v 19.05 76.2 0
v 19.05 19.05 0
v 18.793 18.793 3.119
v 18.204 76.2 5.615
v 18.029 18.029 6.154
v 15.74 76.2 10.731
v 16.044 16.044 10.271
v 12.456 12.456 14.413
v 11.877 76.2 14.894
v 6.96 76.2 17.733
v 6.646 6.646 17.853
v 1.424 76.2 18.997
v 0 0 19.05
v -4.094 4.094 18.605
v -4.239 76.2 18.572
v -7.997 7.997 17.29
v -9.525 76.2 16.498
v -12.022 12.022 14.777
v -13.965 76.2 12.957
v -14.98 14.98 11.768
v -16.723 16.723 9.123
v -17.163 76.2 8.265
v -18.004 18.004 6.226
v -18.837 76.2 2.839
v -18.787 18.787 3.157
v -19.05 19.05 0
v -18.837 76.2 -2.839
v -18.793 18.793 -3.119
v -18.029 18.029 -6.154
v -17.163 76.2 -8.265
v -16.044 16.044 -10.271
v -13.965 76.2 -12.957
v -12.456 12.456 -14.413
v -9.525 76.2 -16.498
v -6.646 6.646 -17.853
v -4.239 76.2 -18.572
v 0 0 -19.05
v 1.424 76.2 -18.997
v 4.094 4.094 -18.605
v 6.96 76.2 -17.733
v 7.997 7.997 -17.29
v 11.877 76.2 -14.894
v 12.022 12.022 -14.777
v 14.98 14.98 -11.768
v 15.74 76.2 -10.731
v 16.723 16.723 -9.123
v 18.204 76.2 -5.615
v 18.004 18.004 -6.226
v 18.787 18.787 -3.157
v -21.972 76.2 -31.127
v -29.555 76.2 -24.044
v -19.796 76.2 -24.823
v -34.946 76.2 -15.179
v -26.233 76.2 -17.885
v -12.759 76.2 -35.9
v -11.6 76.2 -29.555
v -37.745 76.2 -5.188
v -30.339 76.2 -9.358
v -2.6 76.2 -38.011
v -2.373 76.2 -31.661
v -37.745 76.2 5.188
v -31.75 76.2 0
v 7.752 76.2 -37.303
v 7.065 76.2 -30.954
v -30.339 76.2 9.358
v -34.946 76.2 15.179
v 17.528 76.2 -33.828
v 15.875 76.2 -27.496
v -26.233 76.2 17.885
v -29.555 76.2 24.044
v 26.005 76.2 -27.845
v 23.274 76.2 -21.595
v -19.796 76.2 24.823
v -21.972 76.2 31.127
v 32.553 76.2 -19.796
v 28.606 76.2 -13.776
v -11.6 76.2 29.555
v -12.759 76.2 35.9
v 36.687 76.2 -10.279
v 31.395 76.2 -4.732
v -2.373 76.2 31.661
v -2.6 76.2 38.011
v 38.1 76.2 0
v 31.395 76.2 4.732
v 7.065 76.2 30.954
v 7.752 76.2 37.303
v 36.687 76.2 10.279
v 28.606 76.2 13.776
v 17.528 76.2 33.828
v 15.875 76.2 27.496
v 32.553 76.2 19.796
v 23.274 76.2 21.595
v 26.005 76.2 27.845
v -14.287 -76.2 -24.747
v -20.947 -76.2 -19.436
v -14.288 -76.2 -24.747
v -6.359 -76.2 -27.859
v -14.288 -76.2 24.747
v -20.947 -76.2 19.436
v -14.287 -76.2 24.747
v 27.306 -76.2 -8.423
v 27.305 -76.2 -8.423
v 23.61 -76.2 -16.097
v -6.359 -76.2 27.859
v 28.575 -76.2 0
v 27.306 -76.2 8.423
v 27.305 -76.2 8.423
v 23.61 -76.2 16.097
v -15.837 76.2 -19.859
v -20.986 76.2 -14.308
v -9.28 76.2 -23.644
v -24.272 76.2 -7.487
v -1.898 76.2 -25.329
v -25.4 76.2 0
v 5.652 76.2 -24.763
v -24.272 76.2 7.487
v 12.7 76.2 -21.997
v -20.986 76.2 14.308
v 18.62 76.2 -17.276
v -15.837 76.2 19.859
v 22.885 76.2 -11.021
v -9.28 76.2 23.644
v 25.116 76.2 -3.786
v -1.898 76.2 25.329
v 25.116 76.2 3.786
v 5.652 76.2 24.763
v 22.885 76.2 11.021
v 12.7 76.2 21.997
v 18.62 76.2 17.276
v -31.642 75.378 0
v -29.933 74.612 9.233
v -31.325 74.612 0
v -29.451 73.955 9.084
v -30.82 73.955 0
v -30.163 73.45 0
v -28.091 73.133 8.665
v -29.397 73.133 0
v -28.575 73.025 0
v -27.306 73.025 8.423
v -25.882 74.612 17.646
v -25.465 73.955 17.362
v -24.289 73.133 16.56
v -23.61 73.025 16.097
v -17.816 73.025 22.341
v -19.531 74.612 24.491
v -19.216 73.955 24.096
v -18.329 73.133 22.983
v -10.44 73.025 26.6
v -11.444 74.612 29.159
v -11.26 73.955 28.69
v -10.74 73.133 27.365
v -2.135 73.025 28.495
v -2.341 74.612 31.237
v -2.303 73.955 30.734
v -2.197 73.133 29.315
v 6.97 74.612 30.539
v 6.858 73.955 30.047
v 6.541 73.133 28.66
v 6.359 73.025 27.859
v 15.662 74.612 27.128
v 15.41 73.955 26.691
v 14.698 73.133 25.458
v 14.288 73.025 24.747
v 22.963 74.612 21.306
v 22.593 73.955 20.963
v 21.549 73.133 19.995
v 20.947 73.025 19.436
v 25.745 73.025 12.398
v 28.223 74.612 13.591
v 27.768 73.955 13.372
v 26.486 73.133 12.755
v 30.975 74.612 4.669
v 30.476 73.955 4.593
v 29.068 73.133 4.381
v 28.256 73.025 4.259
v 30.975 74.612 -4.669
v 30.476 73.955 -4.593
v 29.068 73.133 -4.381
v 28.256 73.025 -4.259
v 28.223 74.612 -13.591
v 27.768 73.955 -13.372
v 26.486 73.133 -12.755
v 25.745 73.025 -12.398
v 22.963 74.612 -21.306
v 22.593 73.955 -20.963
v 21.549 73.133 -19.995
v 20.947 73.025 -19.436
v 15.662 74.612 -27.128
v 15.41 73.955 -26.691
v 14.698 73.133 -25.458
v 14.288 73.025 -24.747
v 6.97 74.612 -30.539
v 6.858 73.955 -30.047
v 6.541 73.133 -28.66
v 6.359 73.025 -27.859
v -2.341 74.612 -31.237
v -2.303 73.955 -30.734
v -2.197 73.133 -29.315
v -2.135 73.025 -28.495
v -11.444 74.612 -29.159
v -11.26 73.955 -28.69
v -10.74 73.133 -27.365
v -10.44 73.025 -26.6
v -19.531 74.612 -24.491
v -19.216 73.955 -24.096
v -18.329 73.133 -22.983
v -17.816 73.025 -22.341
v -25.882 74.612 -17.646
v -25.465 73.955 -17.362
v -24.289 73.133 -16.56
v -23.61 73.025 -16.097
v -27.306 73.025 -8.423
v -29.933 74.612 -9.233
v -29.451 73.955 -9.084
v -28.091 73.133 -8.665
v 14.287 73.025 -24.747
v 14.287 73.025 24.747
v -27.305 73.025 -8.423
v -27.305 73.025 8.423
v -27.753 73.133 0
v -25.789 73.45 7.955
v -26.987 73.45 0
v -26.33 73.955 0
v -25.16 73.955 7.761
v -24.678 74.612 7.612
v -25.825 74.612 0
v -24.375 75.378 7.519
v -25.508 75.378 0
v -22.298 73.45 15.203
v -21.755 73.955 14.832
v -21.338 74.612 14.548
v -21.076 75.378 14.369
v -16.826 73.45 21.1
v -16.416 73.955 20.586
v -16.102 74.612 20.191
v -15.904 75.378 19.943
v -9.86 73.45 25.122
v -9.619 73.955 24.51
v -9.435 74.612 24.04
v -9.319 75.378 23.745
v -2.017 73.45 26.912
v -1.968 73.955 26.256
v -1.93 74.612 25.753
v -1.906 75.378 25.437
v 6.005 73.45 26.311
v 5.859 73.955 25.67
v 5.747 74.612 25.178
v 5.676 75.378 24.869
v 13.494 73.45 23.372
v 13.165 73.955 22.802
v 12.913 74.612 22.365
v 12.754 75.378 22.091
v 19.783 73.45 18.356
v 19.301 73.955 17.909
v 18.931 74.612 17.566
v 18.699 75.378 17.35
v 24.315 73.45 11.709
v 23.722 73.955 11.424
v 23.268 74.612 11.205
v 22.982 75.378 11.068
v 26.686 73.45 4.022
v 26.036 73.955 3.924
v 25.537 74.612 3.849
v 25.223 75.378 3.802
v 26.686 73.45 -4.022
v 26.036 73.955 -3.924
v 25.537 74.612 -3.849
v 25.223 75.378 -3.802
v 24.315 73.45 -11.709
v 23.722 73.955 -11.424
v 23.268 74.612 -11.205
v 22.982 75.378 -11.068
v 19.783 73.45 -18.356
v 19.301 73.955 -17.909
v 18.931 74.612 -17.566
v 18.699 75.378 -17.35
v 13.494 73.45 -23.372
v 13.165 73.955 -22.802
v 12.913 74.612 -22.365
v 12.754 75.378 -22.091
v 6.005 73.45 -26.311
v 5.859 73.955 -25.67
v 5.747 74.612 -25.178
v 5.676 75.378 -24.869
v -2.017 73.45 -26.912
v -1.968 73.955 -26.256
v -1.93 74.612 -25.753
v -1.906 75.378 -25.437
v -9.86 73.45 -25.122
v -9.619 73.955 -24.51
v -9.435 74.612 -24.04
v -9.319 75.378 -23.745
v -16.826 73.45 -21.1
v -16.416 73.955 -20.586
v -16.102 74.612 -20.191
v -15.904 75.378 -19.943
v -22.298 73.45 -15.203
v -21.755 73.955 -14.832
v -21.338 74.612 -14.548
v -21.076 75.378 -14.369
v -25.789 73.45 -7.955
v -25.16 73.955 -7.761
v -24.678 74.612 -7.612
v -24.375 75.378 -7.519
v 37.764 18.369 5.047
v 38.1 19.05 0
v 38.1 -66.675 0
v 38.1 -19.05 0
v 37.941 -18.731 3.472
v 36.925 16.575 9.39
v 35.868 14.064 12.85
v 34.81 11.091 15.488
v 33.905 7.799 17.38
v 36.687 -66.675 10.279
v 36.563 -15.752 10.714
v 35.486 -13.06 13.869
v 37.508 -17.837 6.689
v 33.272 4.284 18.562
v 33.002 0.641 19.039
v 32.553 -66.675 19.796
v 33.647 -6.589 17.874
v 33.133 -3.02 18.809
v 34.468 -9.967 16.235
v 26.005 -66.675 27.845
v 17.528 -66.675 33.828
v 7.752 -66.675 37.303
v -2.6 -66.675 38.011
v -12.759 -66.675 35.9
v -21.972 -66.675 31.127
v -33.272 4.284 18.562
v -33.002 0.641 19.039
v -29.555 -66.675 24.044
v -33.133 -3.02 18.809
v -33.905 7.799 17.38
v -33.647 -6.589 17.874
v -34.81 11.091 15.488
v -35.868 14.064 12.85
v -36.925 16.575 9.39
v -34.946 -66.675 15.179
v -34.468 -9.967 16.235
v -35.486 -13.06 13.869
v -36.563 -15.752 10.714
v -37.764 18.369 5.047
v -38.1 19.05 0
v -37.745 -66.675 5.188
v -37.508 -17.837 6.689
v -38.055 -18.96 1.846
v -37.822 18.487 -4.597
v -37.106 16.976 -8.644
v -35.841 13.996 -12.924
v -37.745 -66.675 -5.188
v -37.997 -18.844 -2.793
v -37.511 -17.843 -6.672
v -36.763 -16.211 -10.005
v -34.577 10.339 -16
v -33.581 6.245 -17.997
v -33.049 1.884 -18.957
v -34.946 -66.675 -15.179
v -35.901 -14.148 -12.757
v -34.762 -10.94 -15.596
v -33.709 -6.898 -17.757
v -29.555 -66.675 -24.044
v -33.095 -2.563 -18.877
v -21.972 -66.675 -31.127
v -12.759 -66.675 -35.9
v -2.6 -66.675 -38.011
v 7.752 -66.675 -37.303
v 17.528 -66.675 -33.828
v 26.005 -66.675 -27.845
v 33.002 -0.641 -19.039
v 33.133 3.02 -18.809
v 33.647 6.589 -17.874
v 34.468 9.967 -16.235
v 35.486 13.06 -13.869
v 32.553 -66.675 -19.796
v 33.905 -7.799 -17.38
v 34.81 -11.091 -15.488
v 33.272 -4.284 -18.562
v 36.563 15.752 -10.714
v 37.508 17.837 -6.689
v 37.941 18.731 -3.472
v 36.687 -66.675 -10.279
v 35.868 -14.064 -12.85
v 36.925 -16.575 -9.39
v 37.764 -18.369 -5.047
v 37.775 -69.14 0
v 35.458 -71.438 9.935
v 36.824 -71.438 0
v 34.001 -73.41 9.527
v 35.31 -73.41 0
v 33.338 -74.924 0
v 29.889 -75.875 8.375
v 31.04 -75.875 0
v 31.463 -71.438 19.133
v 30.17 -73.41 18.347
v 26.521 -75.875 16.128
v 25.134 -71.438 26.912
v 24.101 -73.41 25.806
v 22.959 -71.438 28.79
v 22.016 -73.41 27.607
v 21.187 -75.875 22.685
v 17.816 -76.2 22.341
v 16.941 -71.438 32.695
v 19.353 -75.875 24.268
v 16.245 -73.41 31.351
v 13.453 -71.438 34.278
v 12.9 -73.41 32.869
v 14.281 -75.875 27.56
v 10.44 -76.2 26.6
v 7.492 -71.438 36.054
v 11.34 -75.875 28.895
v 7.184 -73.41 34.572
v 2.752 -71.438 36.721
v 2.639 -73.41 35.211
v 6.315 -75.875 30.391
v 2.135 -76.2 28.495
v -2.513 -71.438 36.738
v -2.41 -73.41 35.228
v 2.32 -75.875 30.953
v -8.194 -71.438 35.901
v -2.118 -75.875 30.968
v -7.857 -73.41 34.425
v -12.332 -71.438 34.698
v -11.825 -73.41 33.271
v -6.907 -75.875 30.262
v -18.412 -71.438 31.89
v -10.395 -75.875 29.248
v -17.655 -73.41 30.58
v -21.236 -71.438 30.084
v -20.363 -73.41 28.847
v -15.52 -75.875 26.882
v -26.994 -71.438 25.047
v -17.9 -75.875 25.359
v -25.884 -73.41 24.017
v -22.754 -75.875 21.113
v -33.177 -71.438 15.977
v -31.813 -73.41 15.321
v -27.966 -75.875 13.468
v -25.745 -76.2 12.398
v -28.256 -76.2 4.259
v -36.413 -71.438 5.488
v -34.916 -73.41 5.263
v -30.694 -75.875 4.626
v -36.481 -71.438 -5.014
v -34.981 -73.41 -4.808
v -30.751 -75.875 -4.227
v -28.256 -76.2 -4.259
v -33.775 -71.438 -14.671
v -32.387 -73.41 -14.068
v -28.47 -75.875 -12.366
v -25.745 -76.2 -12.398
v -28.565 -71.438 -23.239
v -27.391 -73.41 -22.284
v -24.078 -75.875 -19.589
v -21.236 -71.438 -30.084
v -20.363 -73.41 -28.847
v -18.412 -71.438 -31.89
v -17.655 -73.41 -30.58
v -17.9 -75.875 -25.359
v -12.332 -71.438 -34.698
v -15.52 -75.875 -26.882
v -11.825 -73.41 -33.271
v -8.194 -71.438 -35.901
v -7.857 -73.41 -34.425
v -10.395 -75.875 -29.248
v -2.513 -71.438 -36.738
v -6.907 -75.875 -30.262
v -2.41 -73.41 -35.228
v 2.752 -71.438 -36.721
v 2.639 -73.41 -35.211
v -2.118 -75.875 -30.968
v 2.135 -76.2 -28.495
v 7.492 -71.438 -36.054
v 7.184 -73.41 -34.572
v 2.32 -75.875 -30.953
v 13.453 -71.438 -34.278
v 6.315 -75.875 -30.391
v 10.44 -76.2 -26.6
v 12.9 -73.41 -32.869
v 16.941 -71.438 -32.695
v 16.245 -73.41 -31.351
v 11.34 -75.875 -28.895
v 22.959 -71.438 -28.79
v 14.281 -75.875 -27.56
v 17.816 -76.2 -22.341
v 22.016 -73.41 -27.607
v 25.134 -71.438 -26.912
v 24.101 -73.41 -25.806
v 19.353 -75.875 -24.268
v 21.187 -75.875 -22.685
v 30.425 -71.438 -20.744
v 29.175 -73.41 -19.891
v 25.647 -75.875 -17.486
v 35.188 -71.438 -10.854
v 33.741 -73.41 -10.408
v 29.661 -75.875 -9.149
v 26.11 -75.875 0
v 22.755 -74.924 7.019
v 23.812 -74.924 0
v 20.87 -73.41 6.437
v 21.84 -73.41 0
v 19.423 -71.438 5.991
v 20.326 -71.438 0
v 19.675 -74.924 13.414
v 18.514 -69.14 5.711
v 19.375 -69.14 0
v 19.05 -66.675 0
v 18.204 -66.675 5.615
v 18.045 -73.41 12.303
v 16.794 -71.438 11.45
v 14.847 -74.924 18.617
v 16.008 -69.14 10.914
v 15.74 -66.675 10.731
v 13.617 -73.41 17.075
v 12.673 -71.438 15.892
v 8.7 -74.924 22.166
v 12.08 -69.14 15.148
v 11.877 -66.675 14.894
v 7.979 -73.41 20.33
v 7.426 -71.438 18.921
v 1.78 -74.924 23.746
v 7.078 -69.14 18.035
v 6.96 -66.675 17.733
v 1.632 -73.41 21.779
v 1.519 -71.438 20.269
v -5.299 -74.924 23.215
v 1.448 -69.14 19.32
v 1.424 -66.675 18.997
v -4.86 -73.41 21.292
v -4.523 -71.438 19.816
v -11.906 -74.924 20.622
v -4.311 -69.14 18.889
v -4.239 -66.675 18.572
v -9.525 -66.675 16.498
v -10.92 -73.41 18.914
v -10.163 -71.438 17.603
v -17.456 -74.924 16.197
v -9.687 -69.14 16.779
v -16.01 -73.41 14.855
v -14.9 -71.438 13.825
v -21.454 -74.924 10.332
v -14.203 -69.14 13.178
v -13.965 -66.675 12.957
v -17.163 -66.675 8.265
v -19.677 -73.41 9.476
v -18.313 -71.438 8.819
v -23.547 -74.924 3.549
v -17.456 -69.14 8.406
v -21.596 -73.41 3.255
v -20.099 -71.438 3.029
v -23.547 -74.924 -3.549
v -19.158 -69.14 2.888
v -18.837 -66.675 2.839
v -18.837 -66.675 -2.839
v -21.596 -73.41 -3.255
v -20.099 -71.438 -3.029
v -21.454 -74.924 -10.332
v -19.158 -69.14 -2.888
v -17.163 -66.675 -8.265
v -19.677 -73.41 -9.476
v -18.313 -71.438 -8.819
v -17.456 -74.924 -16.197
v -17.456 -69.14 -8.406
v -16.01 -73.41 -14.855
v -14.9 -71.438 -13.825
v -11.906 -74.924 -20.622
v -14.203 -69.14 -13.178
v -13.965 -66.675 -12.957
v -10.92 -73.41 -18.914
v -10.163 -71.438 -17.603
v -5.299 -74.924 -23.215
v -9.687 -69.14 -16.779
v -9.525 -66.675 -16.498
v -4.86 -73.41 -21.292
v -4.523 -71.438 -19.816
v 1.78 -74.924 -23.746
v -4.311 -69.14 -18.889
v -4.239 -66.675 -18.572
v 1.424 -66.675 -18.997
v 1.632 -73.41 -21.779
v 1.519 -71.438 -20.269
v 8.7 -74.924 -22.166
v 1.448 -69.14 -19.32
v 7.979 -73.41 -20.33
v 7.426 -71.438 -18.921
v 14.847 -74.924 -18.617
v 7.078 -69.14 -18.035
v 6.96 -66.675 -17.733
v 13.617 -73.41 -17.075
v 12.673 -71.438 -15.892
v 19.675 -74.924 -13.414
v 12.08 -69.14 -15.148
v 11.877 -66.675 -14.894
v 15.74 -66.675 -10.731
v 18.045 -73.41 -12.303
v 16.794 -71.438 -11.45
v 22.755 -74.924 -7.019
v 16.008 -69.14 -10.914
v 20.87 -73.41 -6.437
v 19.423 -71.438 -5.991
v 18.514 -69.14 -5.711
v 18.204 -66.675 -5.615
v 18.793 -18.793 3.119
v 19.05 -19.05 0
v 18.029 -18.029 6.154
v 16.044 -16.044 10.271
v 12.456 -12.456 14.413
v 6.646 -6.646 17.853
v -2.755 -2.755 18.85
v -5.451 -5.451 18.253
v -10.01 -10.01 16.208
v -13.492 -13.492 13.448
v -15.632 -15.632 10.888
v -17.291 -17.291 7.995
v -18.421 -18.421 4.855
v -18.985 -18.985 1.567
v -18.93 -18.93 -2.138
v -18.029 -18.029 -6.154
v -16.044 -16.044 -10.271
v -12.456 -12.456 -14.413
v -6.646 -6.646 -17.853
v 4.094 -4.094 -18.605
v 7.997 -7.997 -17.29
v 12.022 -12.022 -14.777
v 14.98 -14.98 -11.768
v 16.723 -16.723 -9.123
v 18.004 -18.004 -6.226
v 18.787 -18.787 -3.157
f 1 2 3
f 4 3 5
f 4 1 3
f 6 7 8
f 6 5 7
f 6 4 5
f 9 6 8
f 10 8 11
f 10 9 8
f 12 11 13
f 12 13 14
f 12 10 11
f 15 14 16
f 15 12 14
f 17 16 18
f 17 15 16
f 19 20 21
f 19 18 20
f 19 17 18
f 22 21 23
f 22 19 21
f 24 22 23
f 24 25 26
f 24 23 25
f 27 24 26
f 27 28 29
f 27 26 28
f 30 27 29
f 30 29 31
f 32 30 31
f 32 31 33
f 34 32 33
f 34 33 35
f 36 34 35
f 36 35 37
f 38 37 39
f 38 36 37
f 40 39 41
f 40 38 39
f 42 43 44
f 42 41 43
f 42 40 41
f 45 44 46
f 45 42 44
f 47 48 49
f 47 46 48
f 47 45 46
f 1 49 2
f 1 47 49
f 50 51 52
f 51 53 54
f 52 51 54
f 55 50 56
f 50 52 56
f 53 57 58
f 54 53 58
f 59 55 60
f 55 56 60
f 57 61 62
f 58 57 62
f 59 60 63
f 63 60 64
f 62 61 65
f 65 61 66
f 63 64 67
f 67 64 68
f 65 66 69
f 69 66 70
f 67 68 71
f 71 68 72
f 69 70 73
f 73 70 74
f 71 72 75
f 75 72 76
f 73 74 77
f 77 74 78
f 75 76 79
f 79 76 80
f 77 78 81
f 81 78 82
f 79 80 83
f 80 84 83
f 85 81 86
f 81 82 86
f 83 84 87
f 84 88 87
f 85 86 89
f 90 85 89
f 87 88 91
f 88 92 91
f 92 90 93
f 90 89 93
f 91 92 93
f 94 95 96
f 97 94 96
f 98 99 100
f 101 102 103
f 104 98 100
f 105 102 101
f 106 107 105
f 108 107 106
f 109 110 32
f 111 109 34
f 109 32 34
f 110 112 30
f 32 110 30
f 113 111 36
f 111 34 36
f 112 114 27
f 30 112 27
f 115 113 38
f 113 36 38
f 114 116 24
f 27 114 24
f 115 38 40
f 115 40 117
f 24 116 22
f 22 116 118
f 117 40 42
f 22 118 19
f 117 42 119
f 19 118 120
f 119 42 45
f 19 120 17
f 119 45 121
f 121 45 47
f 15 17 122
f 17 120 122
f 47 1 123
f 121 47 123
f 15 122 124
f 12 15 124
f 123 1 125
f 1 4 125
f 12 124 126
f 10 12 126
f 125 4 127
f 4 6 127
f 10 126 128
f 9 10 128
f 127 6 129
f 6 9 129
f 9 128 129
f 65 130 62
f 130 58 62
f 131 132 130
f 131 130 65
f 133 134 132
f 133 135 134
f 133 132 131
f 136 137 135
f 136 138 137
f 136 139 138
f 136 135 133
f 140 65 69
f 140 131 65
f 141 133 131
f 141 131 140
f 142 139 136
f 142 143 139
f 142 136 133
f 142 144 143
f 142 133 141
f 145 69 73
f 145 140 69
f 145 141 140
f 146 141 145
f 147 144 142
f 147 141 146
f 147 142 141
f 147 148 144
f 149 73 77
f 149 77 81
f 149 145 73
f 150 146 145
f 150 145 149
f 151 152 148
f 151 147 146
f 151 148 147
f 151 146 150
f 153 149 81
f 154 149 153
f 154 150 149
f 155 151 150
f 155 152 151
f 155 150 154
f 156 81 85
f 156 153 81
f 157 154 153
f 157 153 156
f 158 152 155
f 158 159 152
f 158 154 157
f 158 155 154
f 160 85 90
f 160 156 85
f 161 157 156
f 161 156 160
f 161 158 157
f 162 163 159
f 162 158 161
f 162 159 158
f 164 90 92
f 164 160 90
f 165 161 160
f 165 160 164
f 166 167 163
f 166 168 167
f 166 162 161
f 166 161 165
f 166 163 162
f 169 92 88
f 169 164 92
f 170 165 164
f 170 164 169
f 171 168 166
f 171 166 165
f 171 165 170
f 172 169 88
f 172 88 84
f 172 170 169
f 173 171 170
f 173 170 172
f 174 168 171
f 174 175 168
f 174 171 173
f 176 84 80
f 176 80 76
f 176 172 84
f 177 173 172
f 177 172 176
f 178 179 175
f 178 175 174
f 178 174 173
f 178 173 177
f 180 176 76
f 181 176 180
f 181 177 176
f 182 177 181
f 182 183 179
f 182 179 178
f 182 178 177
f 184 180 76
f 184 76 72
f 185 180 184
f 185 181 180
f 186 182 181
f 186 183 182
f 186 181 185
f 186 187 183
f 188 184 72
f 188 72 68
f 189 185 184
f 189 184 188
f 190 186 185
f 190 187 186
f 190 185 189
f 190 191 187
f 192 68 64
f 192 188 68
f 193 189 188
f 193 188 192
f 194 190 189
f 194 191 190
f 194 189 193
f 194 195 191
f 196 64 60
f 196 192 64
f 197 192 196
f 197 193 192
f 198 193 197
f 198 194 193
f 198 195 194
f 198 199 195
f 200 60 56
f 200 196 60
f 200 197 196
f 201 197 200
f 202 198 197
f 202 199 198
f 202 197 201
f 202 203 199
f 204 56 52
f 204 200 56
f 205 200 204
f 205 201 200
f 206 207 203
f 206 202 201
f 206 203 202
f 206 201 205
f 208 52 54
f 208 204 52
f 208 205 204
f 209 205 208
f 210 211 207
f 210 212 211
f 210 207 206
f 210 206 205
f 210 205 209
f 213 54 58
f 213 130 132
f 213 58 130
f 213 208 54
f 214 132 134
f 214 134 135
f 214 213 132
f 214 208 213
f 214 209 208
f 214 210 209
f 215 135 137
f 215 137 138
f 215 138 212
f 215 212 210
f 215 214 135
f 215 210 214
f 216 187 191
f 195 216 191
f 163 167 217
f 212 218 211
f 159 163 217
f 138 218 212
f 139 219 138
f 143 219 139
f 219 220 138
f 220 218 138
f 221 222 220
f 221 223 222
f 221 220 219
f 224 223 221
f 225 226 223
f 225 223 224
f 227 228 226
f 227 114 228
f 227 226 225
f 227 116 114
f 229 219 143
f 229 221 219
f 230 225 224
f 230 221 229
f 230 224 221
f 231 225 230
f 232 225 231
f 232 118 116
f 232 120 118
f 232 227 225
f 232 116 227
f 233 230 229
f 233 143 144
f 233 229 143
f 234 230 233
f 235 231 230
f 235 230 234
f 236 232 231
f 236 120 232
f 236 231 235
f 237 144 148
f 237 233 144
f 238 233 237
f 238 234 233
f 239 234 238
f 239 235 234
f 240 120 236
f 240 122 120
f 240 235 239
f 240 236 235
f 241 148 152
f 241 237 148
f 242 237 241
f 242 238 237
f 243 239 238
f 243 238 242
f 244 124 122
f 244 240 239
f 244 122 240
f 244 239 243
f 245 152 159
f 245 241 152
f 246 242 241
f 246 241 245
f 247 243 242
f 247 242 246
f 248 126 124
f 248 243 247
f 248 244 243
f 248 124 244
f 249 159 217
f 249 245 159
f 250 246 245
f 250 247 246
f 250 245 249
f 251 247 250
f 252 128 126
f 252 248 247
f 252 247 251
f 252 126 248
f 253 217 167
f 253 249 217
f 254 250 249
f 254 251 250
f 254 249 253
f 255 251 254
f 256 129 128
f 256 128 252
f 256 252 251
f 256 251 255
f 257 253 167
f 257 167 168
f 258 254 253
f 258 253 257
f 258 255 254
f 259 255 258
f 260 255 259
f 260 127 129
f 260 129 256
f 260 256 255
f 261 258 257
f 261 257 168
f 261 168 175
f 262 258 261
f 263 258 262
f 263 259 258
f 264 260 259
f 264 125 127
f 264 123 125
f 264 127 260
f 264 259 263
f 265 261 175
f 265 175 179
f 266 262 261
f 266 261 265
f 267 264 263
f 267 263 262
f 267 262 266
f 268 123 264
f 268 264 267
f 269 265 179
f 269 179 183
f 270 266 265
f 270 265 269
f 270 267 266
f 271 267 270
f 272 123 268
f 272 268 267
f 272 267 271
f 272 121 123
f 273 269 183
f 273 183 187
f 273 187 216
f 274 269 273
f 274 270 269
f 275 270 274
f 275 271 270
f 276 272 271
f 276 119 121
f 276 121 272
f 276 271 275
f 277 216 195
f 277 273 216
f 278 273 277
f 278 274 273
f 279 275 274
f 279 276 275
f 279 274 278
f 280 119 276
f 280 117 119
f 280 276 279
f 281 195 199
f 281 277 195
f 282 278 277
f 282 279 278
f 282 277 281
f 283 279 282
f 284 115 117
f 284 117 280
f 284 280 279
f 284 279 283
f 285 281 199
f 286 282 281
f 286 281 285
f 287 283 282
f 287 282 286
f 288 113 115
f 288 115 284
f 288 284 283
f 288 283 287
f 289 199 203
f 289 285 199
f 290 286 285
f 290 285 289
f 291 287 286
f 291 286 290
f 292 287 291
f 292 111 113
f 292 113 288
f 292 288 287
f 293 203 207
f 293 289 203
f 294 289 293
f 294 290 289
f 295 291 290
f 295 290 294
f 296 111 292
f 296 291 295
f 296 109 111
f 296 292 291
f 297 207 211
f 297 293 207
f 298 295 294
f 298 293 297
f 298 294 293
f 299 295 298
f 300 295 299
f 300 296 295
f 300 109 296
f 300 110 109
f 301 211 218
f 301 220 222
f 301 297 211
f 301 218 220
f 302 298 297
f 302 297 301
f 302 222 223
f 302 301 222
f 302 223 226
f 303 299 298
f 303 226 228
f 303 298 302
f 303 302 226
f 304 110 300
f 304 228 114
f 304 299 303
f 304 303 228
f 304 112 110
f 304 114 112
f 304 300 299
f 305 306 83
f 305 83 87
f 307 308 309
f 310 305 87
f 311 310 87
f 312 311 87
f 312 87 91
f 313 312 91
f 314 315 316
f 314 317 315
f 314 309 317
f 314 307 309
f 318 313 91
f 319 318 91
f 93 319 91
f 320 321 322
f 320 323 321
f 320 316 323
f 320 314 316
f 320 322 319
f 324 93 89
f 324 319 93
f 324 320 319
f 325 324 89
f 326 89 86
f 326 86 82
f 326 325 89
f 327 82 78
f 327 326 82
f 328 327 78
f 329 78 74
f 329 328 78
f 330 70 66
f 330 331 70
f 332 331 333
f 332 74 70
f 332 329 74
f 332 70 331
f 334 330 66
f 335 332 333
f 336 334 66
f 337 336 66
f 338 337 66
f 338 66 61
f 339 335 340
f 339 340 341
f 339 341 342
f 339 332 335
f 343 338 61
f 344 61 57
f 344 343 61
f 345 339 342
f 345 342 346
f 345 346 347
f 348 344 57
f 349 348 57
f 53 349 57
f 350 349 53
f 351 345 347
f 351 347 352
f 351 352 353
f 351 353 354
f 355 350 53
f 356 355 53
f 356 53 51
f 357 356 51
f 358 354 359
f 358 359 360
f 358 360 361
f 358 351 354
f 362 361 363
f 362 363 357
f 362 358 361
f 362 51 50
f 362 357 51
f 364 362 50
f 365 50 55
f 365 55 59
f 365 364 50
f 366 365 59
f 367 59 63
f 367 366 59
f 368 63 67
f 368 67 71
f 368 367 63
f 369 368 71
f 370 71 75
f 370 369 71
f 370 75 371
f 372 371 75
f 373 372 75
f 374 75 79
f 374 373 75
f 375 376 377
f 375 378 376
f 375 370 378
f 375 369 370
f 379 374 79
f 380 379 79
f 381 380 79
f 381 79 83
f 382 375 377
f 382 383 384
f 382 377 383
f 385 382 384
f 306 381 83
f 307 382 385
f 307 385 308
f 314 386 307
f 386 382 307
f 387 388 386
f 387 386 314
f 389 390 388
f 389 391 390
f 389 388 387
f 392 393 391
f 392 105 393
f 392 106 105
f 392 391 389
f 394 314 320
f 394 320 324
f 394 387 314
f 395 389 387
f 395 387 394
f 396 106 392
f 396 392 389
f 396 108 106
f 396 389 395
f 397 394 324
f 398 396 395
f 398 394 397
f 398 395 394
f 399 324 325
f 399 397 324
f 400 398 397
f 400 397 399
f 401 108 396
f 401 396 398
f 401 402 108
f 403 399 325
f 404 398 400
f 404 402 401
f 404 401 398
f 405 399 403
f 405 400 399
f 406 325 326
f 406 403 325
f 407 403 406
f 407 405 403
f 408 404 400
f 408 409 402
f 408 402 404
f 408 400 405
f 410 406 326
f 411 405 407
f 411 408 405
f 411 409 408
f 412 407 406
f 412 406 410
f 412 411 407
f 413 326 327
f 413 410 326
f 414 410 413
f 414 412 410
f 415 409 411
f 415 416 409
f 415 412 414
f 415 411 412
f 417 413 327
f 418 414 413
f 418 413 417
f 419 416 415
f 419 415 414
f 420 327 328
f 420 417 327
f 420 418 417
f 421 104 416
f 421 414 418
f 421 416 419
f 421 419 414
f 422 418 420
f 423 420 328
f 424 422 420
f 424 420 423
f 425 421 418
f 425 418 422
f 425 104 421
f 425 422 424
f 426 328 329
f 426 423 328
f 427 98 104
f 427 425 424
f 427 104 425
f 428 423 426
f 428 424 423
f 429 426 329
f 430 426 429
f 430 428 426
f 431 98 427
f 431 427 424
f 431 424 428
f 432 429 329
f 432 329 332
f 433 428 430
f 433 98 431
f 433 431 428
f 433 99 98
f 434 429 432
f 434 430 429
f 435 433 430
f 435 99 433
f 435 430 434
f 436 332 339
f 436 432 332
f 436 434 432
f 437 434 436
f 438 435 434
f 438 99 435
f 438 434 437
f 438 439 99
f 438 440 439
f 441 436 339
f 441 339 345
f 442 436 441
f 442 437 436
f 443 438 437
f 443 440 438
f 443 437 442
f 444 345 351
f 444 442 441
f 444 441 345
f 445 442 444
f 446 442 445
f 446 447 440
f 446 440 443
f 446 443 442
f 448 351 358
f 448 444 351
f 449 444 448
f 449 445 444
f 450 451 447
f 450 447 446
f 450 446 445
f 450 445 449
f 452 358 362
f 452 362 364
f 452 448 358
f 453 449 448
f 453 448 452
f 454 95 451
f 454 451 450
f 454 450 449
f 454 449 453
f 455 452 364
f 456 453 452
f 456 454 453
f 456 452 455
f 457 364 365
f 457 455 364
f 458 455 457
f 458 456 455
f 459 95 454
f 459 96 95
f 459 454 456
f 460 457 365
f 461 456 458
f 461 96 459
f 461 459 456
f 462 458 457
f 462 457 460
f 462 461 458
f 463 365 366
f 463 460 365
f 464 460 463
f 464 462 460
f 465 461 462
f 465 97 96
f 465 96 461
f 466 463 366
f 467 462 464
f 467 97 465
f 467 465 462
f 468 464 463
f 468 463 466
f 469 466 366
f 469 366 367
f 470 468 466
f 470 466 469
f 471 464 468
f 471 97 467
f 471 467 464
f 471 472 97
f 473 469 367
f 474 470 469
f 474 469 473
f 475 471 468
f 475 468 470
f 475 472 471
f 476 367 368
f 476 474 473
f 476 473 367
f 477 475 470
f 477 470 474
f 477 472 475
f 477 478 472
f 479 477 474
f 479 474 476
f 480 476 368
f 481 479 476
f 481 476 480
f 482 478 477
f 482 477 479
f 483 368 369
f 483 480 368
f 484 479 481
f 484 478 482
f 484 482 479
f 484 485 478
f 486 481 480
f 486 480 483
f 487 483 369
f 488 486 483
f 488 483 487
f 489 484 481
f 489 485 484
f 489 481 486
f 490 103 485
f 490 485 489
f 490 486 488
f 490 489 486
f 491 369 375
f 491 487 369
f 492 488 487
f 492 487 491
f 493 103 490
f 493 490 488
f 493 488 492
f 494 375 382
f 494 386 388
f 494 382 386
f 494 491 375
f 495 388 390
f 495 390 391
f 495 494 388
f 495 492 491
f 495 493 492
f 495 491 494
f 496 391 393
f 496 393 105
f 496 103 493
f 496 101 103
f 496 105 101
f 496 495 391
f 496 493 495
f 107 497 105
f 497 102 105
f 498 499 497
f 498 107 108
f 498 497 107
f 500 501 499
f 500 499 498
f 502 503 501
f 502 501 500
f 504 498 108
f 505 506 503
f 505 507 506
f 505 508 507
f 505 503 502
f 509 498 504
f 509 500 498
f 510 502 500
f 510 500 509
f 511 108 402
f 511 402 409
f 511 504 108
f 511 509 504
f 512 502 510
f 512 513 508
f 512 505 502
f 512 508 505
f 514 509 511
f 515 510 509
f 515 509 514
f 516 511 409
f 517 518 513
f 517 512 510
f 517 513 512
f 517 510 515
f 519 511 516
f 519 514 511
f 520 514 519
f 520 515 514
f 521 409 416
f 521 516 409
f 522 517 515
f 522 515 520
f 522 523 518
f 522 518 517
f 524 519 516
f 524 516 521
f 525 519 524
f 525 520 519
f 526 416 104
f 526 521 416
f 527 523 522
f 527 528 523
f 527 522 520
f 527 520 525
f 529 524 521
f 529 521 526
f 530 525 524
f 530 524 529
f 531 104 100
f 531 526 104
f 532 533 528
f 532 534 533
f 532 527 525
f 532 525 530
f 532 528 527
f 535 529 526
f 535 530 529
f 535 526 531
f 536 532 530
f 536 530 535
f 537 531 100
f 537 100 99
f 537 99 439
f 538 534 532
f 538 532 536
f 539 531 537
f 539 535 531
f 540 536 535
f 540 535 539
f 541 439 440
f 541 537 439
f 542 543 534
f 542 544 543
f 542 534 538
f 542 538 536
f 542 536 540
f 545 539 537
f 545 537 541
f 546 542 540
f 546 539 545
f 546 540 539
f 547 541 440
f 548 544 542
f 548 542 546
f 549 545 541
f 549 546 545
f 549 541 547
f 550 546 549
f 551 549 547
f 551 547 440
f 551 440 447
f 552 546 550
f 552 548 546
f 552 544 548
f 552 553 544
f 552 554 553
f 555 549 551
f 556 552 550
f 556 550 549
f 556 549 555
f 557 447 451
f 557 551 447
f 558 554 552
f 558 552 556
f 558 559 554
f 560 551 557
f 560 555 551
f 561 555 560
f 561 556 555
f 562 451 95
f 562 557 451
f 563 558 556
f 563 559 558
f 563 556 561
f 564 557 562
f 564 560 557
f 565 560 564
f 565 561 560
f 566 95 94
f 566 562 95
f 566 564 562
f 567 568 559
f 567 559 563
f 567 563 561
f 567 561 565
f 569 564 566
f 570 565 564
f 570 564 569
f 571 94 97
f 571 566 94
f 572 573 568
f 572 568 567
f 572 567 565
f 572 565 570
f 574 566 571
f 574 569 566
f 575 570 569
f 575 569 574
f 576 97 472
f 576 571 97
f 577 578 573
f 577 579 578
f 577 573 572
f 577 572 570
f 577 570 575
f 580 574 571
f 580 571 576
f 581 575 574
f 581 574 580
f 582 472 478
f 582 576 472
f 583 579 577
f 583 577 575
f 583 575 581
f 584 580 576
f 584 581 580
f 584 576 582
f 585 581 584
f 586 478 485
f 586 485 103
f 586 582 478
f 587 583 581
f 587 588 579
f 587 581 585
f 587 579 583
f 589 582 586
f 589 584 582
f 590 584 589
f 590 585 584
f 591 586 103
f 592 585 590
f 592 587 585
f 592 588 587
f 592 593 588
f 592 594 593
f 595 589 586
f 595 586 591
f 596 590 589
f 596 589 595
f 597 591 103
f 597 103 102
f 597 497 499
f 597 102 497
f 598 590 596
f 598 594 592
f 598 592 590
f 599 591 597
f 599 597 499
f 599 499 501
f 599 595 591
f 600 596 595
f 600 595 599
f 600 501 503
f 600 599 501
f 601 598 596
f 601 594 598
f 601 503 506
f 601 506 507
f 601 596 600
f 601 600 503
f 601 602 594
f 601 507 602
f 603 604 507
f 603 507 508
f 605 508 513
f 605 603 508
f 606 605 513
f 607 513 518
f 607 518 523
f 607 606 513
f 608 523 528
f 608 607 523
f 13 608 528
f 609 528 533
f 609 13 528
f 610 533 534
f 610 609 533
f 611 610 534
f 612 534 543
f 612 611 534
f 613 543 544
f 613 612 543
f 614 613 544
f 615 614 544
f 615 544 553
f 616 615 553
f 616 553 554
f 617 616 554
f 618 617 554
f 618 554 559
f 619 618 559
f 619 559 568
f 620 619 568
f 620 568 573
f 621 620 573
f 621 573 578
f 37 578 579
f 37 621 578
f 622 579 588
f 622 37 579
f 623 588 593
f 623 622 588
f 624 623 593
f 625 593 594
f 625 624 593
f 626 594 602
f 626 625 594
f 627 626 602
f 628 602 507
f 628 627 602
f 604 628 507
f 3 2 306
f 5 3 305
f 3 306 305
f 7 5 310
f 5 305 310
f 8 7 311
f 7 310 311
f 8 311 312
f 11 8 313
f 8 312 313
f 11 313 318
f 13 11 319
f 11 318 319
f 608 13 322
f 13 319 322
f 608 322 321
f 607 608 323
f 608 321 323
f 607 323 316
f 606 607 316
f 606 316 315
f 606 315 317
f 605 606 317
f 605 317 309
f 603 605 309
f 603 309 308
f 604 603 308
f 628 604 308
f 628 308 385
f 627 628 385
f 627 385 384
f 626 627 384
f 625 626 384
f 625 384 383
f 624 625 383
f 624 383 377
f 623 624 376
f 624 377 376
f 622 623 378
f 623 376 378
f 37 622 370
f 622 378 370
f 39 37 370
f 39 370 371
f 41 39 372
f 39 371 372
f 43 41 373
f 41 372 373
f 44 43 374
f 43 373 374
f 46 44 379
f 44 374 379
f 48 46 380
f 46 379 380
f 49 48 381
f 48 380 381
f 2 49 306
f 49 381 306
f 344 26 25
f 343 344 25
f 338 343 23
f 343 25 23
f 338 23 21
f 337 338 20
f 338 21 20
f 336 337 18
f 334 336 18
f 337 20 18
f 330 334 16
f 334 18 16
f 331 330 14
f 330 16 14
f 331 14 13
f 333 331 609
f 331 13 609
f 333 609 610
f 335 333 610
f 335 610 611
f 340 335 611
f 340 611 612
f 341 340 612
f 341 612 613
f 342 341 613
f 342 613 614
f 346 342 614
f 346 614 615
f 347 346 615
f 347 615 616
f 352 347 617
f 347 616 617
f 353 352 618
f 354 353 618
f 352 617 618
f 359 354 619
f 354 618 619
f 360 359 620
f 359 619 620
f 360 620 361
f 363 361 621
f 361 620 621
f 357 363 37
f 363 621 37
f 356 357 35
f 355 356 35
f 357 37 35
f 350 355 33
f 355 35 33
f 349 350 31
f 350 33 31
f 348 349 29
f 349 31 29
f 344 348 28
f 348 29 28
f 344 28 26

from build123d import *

# Parameters (mm, degrees)
F0_R     = 38.1
F0_R_2   = 19.05
F1_DEPTH = 76.2
F2_R     = 9.52499
F4_R     = 31.75
F4_R_2   = 25.4
F5_DEPTH = 3.175
F6_R     = 3.17499
F8_R     = 19.05
F9_DEPTH = 152.4


# Not quite as in the source:
# - a fillet or chamfer is up to 0.001 mm smaller than in the source, because OpenCascade refuses the exact size


with BuildPart() as f1:
    # F0 (on Front) → F1 (new body, symmetric)
    with BuildSketch(Plane.XZ):
        Circle(F0_R)
        Circle(F0_R_2, mode=Mode.SUBTRACT)
    extrude(amount=F1_DEPTH, both=True)

    # F2 (radius 9.525 in the source; OpenCascade refuses exactly that, so slightly less here)
    f2_edges = [f1.edges().sort_by_distance(p)[0] for p in [
        (-38.1, -76.2, 0),
        (-19.05, -76.2, 0),
    ]]
    fillet(f2_edges, radius=F2_R)

    # F4 (on offset) → F5 (cut)
    with BuildSketch(Plane(origin=(0, 76.2, 0), x_dir=(-1, 0, 0), z_dir=(0, 1, 0))):
        Circle(F4_R)
        Circle(F4_R_2, mode=Mode.SUBTRACT)
    extrude(amount=-F5_DEPTH, mode=Mode.SUBTRACT)

    # F6 (radius 3.175 in the source; OpenCascade refuses exactly that, so slightly less here)
    f6_edges = [f1.edges().sort_by_distance(p)[0] for p in [
        (31.75, 73.025, 0),
        (25.4, 73.025, 0),
    ]]
    fillet(f6_edges, radius=F6_R)

    # F8 (on offset) → F9 (cut)
    with BuildSketch(Plane.YZ.offset(76.2)):
        Circle(F8_R)
    extrude(amount=-F9_DEPTH, mode=Mode.SUBTRACT)


solid = f1.part
